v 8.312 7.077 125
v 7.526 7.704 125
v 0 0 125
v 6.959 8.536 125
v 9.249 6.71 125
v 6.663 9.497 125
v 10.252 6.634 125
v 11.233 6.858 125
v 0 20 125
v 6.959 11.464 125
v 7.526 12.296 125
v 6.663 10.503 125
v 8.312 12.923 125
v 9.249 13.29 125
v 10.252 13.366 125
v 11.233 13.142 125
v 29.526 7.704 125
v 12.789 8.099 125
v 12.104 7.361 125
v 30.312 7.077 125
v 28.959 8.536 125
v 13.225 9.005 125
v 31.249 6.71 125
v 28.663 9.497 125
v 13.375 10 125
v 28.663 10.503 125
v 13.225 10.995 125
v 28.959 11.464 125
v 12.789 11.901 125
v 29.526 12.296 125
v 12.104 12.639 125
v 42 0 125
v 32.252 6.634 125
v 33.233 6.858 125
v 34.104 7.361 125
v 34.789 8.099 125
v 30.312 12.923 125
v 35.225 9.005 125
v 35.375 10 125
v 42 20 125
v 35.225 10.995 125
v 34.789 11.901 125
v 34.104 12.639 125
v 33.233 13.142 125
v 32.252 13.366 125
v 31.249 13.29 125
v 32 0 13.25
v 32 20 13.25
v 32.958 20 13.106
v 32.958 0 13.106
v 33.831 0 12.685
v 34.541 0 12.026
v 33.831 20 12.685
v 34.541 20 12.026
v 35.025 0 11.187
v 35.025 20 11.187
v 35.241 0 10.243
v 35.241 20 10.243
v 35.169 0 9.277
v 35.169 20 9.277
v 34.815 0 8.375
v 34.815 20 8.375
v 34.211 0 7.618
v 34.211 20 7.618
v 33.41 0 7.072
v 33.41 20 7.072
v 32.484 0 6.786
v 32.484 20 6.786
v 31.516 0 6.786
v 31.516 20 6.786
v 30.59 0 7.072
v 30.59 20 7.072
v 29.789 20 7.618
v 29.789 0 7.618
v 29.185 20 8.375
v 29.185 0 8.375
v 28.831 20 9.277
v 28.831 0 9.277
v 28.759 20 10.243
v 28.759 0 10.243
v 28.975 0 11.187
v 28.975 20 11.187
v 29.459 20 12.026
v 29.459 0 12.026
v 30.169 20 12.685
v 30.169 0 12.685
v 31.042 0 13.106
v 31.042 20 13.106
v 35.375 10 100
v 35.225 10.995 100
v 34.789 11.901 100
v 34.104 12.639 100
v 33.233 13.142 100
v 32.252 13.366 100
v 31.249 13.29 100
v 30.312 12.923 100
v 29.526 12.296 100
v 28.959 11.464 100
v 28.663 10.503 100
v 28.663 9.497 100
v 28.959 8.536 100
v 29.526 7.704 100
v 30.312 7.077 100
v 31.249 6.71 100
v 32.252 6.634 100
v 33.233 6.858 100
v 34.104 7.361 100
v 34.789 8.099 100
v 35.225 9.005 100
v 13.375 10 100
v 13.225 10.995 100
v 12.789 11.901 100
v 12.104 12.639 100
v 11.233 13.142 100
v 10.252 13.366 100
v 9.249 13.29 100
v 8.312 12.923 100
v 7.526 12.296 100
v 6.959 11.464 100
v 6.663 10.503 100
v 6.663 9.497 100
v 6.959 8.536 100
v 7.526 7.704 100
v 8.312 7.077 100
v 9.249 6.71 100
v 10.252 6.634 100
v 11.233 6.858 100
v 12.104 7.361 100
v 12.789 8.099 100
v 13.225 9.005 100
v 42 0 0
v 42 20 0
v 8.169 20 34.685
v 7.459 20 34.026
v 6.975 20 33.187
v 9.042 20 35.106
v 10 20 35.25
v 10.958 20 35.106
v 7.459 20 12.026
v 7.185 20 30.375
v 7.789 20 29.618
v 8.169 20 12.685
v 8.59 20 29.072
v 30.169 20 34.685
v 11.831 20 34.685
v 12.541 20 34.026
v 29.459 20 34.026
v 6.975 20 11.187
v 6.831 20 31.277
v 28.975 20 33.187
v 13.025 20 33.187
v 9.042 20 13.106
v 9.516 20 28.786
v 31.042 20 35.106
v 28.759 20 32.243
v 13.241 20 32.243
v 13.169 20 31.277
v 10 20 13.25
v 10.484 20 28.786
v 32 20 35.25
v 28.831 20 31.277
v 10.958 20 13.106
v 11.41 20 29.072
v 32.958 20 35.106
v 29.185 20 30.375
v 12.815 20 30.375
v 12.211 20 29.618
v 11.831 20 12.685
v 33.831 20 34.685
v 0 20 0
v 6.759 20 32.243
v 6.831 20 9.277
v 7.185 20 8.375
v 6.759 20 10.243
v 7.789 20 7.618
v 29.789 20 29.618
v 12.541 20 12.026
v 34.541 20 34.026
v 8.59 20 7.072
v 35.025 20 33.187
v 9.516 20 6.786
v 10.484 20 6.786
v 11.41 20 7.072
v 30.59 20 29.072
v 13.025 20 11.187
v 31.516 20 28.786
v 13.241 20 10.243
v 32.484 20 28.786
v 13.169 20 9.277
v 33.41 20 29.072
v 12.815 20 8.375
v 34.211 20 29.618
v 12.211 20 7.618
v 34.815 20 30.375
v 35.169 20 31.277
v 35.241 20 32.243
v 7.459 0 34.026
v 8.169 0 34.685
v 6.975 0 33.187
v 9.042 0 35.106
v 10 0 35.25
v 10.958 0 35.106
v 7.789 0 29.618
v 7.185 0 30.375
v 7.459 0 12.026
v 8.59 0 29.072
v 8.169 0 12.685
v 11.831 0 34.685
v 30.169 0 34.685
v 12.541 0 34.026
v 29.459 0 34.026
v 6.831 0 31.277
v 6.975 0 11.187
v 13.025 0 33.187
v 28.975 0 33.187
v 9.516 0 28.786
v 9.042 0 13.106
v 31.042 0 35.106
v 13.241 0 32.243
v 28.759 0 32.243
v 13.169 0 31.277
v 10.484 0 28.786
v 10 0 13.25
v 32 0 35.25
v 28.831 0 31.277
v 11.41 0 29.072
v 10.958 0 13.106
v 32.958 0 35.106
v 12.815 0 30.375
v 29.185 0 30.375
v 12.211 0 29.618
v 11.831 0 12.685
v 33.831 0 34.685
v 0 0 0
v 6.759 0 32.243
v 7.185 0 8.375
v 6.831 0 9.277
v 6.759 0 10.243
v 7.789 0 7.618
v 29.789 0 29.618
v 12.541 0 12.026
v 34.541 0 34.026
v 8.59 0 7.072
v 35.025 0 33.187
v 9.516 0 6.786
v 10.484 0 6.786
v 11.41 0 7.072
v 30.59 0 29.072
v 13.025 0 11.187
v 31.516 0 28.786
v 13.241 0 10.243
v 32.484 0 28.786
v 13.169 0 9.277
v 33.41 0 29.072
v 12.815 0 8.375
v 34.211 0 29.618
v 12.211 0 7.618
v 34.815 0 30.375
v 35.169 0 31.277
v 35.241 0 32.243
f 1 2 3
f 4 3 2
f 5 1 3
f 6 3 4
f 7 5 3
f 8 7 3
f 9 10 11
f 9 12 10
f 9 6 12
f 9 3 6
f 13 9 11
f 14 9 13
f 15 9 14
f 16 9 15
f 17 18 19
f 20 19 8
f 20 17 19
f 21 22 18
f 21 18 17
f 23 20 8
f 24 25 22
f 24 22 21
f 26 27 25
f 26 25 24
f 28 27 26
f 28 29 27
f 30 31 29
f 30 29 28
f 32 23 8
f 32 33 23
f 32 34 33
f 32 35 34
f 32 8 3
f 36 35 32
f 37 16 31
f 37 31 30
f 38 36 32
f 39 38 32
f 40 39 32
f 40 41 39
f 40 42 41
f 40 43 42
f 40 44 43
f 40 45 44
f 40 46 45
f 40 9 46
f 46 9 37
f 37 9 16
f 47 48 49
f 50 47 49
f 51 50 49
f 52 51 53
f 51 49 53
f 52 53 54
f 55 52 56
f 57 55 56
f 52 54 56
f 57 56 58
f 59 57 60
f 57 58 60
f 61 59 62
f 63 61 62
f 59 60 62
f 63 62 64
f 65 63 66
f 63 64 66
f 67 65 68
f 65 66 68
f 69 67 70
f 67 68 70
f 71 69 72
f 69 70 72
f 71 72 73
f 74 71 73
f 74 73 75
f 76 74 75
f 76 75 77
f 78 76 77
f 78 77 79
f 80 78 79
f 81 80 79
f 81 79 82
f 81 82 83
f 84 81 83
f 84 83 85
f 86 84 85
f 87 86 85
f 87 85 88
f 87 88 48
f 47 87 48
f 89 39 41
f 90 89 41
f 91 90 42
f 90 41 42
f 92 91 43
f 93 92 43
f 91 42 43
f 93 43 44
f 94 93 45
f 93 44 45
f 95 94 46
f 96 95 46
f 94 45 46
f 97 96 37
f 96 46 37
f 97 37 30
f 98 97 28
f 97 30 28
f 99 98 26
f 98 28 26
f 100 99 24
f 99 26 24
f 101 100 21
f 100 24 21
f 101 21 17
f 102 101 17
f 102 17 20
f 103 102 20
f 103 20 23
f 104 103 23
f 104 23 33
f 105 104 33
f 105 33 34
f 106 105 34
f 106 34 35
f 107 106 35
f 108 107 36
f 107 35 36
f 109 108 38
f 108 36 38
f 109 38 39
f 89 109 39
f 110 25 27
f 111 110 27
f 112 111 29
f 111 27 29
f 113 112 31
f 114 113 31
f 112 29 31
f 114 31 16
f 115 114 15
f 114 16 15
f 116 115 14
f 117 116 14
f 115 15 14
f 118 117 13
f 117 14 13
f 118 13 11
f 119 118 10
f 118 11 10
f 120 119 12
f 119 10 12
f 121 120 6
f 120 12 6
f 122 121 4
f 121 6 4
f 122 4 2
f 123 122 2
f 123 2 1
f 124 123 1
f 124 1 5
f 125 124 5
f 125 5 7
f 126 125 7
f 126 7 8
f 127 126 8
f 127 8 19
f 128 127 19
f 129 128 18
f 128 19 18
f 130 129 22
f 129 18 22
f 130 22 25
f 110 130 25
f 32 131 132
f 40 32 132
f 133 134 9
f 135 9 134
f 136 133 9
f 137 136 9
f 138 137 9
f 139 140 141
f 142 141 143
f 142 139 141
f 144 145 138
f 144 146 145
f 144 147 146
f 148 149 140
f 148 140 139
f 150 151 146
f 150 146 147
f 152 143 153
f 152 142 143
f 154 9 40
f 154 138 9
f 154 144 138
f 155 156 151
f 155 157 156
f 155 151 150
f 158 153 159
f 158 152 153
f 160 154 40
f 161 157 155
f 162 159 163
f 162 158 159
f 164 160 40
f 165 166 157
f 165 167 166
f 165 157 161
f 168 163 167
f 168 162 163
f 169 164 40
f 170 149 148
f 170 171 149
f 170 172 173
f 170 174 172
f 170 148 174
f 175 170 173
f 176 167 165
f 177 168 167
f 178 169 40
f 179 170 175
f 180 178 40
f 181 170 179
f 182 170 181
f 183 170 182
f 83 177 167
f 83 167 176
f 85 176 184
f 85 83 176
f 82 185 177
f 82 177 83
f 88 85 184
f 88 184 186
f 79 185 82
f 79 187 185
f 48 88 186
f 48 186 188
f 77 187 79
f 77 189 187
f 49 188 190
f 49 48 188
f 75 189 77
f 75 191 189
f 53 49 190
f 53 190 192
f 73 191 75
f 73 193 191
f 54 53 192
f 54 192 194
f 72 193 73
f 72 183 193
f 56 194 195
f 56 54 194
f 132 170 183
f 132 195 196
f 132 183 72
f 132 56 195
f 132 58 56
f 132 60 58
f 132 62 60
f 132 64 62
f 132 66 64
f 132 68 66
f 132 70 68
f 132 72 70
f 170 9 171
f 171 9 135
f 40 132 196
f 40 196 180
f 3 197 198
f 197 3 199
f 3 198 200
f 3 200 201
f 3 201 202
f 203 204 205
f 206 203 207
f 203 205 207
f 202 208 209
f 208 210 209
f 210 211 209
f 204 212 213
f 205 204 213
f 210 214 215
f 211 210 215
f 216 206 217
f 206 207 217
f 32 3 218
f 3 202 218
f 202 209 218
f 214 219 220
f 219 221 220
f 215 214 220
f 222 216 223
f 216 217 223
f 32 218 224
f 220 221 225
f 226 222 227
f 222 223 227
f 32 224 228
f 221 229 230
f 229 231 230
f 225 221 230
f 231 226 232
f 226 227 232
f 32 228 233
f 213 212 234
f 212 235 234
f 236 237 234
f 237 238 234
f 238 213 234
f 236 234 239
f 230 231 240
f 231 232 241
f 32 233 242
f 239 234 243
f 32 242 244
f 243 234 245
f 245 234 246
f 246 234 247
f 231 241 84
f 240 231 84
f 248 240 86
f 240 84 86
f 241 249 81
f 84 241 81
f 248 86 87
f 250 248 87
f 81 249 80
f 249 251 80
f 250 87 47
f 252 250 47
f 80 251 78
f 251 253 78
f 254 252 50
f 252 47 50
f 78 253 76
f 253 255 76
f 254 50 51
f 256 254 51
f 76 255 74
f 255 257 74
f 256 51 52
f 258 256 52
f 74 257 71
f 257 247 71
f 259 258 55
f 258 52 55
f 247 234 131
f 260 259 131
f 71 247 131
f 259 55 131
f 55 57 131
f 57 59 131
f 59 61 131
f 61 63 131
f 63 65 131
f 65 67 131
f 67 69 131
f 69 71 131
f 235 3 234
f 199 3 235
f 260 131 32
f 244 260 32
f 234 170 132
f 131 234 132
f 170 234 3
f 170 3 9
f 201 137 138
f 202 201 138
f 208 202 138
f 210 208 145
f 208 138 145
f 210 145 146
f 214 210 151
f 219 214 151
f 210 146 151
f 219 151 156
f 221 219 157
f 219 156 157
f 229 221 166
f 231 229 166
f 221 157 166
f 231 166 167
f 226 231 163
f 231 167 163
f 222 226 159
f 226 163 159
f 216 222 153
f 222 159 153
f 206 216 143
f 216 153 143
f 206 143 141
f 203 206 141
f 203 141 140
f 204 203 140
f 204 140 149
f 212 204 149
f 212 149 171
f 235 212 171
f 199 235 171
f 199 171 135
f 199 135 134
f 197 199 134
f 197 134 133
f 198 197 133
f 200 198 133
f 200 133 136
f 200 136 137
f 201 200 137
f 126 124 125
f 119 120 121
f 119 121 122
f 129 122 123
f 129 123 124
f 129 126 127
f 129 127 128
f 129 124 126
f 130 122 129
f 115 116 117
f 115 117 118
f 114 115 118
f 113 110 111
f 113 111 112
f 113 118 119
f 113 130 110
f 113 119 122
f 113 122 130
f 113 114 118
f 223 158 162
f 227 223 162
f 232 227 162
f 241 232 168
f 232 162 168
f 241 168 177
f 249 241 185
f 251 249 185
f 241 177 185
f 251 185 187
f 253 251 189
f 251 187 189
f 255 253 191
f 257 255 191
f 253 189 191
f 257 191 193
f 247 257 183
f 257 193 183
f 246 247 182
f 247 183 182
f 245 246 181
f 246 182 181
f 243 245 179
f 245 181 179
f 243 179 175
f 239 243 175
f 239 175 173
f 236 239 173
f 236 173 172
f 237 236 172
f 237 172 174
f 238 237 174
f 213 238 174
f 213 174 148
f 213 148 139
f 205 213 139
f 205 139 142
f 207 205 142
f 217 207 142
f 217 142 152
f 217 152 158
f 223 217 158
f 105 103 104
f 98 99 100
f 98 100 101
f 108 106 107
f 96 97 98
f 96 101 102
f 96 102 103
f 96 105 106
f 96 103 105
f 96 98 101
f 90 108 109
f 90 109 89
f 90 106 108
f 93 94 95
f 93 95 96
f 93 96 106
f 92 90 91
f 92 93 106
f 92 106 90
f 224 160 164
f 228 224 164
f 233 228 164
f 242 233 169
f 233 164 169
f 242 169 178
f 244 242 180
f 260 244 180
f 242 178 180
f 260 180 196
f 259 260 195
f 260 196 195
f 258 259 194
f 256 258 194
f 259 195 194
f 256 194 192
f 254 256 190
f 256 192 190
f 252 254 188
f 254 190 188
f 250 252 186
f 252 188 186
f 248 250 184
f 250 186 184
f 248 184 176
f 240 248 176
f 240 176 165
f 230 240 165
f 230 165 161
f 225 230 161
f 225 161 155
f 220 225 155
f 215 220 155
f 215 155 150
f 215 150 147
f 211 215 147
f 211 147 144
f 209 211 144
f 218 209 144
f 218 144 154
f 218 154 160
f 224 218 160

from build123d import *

# Parameters (mm, degrees)
ESQUISSE1_W             = 42
ESQUISSE1_H             = 20
BASE_EXTRUSION_DEPTH    = 125
ENL_V_MAT_EXTRU_1_REACH = 135.375
ESQUISSE2_R             = 3.25
ESQUISSE3_R             = 3.375
ENL_V_MAT_EXTRU_2_DEPTH = 25


with BuildPart() as part:
    # Esquisse1 → Base-Extrusion (new body)
    with BuildSketch(Plane.XY):
        with Locations((21, 10)):
            Rectangle(ESQUISSE1_W, ESQUISSE1_H)
    extrude(amount=BASE_EXTRUSION_DEPTH)

    # Esquisse2 → Enlèv. mat.-Extru.1 (cut, up to next)
    with BuildSketch(Plane(origin=(0, 20, 0), x_dir=(-1, 0, 0), z_dir=(0, 1, 0)), mode=Mode.PRIVATE) as enl_v_mat_extru_1_sk1:
        with Locations(Location((-10, 10, 0), (0, 0, 90))):
            Circle(ESQUISSE2_R)
    enl_v_mat_extru_1_tool1 = extrude(enl_v_mat_extru_1_sk1.sketch, amount=-ENL_V_MAT_EXTRU_1_REACH, mode=Mode.PRIVATE) & part.part
    # Esquisse2 → Enlèv. mat.-Extru.1 (cut, up to next)
    with BuildSketch(Plane(origin=(0, 20, 0), x_dir=(-1, 0, 0), z_dir=(0, 1, 0)), mode=Mode.PRIVATE) as enl_v_mat_extru_1_sk2:
        with Locations(Location((-32, 10, 0), (0, 0, 90))):
            Circle(ESQUISSE2_R)
    enl_v_mat_extru_1_tool2 = extrude(enl_v_mat_extru_1_sk2.sketch, amount=-ENL_V_MAT_EXTRU_1_REACH, mode=Mode.PRIVATE) & part.part
    # Esquisse2 → Enlèv. mat.-Extru.1 (cut, up to next)
    with BuildSketch(Plane(origin=(0, 20, 0), x_dir=(-1, 0, 0), z_dir=(0, 1, 0)), mode=Mode.PRIVATE) as enl_v_mat_extru_1_sk3:
        with Locations(Location((-10, 32, 0), (0, 0, 90))):
            Circle(ESQUISSE2_R)
    enl_v_mat_extru_1_tool3 = extrude(enl_v_mat_extru_1_sk3.sketch, amount=-ENL_V_MAT_EXTRU_1_REACH, mode=Mode.PRIVATE) & part.part
    # Esquisse2 → Enlèv. mat.-Extru.1 (cut, up to next)
    with BuildSketch(Plane(origin=(0, 20, 0), x_dir=(-1, 0, 0), z_dir=(0, 1, 0)), mode=Mode.PRIVATE) as enl_v_mat_extru_1_sk4:
        with Locations(Location((-32, 32, 0), (0, 0, 90))):
            Circle(ESQUISSE2_R)
    enl_v_mat_extru_1_tool4 = extrude(enl_v_mat_extru_1_sk4.sketch, amount=-ENL_V_MAT_EXTRU_1_REACH, mode=Mode.PRIVATE) & part.part
    add(enl_v_mat_extru_1_tool1.solids().sort_by_distance((10, 20, 10))[0], mode=Mode.SUBTRACT)
    add(enl_v_mat_extru_1_tool2.solids().sort_by_distance((32, 20, 10))[0], mode=Mode.SUBTRACT)
    add(enl_v_mat_extru_1_tool3.solids().sort_by_distance((10, 20, 32))[0], mode=Mode.SUBTRACT)
    add(enl_v_mat_extru_1_tool4.solids().sort_by_distance((32, 20, 32))[0], mode=Mode.SUBTRACT)

    # Esquisse3 → Enlèv. mat.-Extru.2 (cut)
    with BuildSketch(Plane.XY.offset(125)):
        with Locations((10, 10)):
            Circle(ESQUISSE3_R)
        with Locations((32, 10)):
            Circle(ESQUISSE3_R)
    extrude(amount=-ENL_V_MAT_EXTRU_2_DEPTH, mode=Mode.SUBTRACT)


solid = part.part
